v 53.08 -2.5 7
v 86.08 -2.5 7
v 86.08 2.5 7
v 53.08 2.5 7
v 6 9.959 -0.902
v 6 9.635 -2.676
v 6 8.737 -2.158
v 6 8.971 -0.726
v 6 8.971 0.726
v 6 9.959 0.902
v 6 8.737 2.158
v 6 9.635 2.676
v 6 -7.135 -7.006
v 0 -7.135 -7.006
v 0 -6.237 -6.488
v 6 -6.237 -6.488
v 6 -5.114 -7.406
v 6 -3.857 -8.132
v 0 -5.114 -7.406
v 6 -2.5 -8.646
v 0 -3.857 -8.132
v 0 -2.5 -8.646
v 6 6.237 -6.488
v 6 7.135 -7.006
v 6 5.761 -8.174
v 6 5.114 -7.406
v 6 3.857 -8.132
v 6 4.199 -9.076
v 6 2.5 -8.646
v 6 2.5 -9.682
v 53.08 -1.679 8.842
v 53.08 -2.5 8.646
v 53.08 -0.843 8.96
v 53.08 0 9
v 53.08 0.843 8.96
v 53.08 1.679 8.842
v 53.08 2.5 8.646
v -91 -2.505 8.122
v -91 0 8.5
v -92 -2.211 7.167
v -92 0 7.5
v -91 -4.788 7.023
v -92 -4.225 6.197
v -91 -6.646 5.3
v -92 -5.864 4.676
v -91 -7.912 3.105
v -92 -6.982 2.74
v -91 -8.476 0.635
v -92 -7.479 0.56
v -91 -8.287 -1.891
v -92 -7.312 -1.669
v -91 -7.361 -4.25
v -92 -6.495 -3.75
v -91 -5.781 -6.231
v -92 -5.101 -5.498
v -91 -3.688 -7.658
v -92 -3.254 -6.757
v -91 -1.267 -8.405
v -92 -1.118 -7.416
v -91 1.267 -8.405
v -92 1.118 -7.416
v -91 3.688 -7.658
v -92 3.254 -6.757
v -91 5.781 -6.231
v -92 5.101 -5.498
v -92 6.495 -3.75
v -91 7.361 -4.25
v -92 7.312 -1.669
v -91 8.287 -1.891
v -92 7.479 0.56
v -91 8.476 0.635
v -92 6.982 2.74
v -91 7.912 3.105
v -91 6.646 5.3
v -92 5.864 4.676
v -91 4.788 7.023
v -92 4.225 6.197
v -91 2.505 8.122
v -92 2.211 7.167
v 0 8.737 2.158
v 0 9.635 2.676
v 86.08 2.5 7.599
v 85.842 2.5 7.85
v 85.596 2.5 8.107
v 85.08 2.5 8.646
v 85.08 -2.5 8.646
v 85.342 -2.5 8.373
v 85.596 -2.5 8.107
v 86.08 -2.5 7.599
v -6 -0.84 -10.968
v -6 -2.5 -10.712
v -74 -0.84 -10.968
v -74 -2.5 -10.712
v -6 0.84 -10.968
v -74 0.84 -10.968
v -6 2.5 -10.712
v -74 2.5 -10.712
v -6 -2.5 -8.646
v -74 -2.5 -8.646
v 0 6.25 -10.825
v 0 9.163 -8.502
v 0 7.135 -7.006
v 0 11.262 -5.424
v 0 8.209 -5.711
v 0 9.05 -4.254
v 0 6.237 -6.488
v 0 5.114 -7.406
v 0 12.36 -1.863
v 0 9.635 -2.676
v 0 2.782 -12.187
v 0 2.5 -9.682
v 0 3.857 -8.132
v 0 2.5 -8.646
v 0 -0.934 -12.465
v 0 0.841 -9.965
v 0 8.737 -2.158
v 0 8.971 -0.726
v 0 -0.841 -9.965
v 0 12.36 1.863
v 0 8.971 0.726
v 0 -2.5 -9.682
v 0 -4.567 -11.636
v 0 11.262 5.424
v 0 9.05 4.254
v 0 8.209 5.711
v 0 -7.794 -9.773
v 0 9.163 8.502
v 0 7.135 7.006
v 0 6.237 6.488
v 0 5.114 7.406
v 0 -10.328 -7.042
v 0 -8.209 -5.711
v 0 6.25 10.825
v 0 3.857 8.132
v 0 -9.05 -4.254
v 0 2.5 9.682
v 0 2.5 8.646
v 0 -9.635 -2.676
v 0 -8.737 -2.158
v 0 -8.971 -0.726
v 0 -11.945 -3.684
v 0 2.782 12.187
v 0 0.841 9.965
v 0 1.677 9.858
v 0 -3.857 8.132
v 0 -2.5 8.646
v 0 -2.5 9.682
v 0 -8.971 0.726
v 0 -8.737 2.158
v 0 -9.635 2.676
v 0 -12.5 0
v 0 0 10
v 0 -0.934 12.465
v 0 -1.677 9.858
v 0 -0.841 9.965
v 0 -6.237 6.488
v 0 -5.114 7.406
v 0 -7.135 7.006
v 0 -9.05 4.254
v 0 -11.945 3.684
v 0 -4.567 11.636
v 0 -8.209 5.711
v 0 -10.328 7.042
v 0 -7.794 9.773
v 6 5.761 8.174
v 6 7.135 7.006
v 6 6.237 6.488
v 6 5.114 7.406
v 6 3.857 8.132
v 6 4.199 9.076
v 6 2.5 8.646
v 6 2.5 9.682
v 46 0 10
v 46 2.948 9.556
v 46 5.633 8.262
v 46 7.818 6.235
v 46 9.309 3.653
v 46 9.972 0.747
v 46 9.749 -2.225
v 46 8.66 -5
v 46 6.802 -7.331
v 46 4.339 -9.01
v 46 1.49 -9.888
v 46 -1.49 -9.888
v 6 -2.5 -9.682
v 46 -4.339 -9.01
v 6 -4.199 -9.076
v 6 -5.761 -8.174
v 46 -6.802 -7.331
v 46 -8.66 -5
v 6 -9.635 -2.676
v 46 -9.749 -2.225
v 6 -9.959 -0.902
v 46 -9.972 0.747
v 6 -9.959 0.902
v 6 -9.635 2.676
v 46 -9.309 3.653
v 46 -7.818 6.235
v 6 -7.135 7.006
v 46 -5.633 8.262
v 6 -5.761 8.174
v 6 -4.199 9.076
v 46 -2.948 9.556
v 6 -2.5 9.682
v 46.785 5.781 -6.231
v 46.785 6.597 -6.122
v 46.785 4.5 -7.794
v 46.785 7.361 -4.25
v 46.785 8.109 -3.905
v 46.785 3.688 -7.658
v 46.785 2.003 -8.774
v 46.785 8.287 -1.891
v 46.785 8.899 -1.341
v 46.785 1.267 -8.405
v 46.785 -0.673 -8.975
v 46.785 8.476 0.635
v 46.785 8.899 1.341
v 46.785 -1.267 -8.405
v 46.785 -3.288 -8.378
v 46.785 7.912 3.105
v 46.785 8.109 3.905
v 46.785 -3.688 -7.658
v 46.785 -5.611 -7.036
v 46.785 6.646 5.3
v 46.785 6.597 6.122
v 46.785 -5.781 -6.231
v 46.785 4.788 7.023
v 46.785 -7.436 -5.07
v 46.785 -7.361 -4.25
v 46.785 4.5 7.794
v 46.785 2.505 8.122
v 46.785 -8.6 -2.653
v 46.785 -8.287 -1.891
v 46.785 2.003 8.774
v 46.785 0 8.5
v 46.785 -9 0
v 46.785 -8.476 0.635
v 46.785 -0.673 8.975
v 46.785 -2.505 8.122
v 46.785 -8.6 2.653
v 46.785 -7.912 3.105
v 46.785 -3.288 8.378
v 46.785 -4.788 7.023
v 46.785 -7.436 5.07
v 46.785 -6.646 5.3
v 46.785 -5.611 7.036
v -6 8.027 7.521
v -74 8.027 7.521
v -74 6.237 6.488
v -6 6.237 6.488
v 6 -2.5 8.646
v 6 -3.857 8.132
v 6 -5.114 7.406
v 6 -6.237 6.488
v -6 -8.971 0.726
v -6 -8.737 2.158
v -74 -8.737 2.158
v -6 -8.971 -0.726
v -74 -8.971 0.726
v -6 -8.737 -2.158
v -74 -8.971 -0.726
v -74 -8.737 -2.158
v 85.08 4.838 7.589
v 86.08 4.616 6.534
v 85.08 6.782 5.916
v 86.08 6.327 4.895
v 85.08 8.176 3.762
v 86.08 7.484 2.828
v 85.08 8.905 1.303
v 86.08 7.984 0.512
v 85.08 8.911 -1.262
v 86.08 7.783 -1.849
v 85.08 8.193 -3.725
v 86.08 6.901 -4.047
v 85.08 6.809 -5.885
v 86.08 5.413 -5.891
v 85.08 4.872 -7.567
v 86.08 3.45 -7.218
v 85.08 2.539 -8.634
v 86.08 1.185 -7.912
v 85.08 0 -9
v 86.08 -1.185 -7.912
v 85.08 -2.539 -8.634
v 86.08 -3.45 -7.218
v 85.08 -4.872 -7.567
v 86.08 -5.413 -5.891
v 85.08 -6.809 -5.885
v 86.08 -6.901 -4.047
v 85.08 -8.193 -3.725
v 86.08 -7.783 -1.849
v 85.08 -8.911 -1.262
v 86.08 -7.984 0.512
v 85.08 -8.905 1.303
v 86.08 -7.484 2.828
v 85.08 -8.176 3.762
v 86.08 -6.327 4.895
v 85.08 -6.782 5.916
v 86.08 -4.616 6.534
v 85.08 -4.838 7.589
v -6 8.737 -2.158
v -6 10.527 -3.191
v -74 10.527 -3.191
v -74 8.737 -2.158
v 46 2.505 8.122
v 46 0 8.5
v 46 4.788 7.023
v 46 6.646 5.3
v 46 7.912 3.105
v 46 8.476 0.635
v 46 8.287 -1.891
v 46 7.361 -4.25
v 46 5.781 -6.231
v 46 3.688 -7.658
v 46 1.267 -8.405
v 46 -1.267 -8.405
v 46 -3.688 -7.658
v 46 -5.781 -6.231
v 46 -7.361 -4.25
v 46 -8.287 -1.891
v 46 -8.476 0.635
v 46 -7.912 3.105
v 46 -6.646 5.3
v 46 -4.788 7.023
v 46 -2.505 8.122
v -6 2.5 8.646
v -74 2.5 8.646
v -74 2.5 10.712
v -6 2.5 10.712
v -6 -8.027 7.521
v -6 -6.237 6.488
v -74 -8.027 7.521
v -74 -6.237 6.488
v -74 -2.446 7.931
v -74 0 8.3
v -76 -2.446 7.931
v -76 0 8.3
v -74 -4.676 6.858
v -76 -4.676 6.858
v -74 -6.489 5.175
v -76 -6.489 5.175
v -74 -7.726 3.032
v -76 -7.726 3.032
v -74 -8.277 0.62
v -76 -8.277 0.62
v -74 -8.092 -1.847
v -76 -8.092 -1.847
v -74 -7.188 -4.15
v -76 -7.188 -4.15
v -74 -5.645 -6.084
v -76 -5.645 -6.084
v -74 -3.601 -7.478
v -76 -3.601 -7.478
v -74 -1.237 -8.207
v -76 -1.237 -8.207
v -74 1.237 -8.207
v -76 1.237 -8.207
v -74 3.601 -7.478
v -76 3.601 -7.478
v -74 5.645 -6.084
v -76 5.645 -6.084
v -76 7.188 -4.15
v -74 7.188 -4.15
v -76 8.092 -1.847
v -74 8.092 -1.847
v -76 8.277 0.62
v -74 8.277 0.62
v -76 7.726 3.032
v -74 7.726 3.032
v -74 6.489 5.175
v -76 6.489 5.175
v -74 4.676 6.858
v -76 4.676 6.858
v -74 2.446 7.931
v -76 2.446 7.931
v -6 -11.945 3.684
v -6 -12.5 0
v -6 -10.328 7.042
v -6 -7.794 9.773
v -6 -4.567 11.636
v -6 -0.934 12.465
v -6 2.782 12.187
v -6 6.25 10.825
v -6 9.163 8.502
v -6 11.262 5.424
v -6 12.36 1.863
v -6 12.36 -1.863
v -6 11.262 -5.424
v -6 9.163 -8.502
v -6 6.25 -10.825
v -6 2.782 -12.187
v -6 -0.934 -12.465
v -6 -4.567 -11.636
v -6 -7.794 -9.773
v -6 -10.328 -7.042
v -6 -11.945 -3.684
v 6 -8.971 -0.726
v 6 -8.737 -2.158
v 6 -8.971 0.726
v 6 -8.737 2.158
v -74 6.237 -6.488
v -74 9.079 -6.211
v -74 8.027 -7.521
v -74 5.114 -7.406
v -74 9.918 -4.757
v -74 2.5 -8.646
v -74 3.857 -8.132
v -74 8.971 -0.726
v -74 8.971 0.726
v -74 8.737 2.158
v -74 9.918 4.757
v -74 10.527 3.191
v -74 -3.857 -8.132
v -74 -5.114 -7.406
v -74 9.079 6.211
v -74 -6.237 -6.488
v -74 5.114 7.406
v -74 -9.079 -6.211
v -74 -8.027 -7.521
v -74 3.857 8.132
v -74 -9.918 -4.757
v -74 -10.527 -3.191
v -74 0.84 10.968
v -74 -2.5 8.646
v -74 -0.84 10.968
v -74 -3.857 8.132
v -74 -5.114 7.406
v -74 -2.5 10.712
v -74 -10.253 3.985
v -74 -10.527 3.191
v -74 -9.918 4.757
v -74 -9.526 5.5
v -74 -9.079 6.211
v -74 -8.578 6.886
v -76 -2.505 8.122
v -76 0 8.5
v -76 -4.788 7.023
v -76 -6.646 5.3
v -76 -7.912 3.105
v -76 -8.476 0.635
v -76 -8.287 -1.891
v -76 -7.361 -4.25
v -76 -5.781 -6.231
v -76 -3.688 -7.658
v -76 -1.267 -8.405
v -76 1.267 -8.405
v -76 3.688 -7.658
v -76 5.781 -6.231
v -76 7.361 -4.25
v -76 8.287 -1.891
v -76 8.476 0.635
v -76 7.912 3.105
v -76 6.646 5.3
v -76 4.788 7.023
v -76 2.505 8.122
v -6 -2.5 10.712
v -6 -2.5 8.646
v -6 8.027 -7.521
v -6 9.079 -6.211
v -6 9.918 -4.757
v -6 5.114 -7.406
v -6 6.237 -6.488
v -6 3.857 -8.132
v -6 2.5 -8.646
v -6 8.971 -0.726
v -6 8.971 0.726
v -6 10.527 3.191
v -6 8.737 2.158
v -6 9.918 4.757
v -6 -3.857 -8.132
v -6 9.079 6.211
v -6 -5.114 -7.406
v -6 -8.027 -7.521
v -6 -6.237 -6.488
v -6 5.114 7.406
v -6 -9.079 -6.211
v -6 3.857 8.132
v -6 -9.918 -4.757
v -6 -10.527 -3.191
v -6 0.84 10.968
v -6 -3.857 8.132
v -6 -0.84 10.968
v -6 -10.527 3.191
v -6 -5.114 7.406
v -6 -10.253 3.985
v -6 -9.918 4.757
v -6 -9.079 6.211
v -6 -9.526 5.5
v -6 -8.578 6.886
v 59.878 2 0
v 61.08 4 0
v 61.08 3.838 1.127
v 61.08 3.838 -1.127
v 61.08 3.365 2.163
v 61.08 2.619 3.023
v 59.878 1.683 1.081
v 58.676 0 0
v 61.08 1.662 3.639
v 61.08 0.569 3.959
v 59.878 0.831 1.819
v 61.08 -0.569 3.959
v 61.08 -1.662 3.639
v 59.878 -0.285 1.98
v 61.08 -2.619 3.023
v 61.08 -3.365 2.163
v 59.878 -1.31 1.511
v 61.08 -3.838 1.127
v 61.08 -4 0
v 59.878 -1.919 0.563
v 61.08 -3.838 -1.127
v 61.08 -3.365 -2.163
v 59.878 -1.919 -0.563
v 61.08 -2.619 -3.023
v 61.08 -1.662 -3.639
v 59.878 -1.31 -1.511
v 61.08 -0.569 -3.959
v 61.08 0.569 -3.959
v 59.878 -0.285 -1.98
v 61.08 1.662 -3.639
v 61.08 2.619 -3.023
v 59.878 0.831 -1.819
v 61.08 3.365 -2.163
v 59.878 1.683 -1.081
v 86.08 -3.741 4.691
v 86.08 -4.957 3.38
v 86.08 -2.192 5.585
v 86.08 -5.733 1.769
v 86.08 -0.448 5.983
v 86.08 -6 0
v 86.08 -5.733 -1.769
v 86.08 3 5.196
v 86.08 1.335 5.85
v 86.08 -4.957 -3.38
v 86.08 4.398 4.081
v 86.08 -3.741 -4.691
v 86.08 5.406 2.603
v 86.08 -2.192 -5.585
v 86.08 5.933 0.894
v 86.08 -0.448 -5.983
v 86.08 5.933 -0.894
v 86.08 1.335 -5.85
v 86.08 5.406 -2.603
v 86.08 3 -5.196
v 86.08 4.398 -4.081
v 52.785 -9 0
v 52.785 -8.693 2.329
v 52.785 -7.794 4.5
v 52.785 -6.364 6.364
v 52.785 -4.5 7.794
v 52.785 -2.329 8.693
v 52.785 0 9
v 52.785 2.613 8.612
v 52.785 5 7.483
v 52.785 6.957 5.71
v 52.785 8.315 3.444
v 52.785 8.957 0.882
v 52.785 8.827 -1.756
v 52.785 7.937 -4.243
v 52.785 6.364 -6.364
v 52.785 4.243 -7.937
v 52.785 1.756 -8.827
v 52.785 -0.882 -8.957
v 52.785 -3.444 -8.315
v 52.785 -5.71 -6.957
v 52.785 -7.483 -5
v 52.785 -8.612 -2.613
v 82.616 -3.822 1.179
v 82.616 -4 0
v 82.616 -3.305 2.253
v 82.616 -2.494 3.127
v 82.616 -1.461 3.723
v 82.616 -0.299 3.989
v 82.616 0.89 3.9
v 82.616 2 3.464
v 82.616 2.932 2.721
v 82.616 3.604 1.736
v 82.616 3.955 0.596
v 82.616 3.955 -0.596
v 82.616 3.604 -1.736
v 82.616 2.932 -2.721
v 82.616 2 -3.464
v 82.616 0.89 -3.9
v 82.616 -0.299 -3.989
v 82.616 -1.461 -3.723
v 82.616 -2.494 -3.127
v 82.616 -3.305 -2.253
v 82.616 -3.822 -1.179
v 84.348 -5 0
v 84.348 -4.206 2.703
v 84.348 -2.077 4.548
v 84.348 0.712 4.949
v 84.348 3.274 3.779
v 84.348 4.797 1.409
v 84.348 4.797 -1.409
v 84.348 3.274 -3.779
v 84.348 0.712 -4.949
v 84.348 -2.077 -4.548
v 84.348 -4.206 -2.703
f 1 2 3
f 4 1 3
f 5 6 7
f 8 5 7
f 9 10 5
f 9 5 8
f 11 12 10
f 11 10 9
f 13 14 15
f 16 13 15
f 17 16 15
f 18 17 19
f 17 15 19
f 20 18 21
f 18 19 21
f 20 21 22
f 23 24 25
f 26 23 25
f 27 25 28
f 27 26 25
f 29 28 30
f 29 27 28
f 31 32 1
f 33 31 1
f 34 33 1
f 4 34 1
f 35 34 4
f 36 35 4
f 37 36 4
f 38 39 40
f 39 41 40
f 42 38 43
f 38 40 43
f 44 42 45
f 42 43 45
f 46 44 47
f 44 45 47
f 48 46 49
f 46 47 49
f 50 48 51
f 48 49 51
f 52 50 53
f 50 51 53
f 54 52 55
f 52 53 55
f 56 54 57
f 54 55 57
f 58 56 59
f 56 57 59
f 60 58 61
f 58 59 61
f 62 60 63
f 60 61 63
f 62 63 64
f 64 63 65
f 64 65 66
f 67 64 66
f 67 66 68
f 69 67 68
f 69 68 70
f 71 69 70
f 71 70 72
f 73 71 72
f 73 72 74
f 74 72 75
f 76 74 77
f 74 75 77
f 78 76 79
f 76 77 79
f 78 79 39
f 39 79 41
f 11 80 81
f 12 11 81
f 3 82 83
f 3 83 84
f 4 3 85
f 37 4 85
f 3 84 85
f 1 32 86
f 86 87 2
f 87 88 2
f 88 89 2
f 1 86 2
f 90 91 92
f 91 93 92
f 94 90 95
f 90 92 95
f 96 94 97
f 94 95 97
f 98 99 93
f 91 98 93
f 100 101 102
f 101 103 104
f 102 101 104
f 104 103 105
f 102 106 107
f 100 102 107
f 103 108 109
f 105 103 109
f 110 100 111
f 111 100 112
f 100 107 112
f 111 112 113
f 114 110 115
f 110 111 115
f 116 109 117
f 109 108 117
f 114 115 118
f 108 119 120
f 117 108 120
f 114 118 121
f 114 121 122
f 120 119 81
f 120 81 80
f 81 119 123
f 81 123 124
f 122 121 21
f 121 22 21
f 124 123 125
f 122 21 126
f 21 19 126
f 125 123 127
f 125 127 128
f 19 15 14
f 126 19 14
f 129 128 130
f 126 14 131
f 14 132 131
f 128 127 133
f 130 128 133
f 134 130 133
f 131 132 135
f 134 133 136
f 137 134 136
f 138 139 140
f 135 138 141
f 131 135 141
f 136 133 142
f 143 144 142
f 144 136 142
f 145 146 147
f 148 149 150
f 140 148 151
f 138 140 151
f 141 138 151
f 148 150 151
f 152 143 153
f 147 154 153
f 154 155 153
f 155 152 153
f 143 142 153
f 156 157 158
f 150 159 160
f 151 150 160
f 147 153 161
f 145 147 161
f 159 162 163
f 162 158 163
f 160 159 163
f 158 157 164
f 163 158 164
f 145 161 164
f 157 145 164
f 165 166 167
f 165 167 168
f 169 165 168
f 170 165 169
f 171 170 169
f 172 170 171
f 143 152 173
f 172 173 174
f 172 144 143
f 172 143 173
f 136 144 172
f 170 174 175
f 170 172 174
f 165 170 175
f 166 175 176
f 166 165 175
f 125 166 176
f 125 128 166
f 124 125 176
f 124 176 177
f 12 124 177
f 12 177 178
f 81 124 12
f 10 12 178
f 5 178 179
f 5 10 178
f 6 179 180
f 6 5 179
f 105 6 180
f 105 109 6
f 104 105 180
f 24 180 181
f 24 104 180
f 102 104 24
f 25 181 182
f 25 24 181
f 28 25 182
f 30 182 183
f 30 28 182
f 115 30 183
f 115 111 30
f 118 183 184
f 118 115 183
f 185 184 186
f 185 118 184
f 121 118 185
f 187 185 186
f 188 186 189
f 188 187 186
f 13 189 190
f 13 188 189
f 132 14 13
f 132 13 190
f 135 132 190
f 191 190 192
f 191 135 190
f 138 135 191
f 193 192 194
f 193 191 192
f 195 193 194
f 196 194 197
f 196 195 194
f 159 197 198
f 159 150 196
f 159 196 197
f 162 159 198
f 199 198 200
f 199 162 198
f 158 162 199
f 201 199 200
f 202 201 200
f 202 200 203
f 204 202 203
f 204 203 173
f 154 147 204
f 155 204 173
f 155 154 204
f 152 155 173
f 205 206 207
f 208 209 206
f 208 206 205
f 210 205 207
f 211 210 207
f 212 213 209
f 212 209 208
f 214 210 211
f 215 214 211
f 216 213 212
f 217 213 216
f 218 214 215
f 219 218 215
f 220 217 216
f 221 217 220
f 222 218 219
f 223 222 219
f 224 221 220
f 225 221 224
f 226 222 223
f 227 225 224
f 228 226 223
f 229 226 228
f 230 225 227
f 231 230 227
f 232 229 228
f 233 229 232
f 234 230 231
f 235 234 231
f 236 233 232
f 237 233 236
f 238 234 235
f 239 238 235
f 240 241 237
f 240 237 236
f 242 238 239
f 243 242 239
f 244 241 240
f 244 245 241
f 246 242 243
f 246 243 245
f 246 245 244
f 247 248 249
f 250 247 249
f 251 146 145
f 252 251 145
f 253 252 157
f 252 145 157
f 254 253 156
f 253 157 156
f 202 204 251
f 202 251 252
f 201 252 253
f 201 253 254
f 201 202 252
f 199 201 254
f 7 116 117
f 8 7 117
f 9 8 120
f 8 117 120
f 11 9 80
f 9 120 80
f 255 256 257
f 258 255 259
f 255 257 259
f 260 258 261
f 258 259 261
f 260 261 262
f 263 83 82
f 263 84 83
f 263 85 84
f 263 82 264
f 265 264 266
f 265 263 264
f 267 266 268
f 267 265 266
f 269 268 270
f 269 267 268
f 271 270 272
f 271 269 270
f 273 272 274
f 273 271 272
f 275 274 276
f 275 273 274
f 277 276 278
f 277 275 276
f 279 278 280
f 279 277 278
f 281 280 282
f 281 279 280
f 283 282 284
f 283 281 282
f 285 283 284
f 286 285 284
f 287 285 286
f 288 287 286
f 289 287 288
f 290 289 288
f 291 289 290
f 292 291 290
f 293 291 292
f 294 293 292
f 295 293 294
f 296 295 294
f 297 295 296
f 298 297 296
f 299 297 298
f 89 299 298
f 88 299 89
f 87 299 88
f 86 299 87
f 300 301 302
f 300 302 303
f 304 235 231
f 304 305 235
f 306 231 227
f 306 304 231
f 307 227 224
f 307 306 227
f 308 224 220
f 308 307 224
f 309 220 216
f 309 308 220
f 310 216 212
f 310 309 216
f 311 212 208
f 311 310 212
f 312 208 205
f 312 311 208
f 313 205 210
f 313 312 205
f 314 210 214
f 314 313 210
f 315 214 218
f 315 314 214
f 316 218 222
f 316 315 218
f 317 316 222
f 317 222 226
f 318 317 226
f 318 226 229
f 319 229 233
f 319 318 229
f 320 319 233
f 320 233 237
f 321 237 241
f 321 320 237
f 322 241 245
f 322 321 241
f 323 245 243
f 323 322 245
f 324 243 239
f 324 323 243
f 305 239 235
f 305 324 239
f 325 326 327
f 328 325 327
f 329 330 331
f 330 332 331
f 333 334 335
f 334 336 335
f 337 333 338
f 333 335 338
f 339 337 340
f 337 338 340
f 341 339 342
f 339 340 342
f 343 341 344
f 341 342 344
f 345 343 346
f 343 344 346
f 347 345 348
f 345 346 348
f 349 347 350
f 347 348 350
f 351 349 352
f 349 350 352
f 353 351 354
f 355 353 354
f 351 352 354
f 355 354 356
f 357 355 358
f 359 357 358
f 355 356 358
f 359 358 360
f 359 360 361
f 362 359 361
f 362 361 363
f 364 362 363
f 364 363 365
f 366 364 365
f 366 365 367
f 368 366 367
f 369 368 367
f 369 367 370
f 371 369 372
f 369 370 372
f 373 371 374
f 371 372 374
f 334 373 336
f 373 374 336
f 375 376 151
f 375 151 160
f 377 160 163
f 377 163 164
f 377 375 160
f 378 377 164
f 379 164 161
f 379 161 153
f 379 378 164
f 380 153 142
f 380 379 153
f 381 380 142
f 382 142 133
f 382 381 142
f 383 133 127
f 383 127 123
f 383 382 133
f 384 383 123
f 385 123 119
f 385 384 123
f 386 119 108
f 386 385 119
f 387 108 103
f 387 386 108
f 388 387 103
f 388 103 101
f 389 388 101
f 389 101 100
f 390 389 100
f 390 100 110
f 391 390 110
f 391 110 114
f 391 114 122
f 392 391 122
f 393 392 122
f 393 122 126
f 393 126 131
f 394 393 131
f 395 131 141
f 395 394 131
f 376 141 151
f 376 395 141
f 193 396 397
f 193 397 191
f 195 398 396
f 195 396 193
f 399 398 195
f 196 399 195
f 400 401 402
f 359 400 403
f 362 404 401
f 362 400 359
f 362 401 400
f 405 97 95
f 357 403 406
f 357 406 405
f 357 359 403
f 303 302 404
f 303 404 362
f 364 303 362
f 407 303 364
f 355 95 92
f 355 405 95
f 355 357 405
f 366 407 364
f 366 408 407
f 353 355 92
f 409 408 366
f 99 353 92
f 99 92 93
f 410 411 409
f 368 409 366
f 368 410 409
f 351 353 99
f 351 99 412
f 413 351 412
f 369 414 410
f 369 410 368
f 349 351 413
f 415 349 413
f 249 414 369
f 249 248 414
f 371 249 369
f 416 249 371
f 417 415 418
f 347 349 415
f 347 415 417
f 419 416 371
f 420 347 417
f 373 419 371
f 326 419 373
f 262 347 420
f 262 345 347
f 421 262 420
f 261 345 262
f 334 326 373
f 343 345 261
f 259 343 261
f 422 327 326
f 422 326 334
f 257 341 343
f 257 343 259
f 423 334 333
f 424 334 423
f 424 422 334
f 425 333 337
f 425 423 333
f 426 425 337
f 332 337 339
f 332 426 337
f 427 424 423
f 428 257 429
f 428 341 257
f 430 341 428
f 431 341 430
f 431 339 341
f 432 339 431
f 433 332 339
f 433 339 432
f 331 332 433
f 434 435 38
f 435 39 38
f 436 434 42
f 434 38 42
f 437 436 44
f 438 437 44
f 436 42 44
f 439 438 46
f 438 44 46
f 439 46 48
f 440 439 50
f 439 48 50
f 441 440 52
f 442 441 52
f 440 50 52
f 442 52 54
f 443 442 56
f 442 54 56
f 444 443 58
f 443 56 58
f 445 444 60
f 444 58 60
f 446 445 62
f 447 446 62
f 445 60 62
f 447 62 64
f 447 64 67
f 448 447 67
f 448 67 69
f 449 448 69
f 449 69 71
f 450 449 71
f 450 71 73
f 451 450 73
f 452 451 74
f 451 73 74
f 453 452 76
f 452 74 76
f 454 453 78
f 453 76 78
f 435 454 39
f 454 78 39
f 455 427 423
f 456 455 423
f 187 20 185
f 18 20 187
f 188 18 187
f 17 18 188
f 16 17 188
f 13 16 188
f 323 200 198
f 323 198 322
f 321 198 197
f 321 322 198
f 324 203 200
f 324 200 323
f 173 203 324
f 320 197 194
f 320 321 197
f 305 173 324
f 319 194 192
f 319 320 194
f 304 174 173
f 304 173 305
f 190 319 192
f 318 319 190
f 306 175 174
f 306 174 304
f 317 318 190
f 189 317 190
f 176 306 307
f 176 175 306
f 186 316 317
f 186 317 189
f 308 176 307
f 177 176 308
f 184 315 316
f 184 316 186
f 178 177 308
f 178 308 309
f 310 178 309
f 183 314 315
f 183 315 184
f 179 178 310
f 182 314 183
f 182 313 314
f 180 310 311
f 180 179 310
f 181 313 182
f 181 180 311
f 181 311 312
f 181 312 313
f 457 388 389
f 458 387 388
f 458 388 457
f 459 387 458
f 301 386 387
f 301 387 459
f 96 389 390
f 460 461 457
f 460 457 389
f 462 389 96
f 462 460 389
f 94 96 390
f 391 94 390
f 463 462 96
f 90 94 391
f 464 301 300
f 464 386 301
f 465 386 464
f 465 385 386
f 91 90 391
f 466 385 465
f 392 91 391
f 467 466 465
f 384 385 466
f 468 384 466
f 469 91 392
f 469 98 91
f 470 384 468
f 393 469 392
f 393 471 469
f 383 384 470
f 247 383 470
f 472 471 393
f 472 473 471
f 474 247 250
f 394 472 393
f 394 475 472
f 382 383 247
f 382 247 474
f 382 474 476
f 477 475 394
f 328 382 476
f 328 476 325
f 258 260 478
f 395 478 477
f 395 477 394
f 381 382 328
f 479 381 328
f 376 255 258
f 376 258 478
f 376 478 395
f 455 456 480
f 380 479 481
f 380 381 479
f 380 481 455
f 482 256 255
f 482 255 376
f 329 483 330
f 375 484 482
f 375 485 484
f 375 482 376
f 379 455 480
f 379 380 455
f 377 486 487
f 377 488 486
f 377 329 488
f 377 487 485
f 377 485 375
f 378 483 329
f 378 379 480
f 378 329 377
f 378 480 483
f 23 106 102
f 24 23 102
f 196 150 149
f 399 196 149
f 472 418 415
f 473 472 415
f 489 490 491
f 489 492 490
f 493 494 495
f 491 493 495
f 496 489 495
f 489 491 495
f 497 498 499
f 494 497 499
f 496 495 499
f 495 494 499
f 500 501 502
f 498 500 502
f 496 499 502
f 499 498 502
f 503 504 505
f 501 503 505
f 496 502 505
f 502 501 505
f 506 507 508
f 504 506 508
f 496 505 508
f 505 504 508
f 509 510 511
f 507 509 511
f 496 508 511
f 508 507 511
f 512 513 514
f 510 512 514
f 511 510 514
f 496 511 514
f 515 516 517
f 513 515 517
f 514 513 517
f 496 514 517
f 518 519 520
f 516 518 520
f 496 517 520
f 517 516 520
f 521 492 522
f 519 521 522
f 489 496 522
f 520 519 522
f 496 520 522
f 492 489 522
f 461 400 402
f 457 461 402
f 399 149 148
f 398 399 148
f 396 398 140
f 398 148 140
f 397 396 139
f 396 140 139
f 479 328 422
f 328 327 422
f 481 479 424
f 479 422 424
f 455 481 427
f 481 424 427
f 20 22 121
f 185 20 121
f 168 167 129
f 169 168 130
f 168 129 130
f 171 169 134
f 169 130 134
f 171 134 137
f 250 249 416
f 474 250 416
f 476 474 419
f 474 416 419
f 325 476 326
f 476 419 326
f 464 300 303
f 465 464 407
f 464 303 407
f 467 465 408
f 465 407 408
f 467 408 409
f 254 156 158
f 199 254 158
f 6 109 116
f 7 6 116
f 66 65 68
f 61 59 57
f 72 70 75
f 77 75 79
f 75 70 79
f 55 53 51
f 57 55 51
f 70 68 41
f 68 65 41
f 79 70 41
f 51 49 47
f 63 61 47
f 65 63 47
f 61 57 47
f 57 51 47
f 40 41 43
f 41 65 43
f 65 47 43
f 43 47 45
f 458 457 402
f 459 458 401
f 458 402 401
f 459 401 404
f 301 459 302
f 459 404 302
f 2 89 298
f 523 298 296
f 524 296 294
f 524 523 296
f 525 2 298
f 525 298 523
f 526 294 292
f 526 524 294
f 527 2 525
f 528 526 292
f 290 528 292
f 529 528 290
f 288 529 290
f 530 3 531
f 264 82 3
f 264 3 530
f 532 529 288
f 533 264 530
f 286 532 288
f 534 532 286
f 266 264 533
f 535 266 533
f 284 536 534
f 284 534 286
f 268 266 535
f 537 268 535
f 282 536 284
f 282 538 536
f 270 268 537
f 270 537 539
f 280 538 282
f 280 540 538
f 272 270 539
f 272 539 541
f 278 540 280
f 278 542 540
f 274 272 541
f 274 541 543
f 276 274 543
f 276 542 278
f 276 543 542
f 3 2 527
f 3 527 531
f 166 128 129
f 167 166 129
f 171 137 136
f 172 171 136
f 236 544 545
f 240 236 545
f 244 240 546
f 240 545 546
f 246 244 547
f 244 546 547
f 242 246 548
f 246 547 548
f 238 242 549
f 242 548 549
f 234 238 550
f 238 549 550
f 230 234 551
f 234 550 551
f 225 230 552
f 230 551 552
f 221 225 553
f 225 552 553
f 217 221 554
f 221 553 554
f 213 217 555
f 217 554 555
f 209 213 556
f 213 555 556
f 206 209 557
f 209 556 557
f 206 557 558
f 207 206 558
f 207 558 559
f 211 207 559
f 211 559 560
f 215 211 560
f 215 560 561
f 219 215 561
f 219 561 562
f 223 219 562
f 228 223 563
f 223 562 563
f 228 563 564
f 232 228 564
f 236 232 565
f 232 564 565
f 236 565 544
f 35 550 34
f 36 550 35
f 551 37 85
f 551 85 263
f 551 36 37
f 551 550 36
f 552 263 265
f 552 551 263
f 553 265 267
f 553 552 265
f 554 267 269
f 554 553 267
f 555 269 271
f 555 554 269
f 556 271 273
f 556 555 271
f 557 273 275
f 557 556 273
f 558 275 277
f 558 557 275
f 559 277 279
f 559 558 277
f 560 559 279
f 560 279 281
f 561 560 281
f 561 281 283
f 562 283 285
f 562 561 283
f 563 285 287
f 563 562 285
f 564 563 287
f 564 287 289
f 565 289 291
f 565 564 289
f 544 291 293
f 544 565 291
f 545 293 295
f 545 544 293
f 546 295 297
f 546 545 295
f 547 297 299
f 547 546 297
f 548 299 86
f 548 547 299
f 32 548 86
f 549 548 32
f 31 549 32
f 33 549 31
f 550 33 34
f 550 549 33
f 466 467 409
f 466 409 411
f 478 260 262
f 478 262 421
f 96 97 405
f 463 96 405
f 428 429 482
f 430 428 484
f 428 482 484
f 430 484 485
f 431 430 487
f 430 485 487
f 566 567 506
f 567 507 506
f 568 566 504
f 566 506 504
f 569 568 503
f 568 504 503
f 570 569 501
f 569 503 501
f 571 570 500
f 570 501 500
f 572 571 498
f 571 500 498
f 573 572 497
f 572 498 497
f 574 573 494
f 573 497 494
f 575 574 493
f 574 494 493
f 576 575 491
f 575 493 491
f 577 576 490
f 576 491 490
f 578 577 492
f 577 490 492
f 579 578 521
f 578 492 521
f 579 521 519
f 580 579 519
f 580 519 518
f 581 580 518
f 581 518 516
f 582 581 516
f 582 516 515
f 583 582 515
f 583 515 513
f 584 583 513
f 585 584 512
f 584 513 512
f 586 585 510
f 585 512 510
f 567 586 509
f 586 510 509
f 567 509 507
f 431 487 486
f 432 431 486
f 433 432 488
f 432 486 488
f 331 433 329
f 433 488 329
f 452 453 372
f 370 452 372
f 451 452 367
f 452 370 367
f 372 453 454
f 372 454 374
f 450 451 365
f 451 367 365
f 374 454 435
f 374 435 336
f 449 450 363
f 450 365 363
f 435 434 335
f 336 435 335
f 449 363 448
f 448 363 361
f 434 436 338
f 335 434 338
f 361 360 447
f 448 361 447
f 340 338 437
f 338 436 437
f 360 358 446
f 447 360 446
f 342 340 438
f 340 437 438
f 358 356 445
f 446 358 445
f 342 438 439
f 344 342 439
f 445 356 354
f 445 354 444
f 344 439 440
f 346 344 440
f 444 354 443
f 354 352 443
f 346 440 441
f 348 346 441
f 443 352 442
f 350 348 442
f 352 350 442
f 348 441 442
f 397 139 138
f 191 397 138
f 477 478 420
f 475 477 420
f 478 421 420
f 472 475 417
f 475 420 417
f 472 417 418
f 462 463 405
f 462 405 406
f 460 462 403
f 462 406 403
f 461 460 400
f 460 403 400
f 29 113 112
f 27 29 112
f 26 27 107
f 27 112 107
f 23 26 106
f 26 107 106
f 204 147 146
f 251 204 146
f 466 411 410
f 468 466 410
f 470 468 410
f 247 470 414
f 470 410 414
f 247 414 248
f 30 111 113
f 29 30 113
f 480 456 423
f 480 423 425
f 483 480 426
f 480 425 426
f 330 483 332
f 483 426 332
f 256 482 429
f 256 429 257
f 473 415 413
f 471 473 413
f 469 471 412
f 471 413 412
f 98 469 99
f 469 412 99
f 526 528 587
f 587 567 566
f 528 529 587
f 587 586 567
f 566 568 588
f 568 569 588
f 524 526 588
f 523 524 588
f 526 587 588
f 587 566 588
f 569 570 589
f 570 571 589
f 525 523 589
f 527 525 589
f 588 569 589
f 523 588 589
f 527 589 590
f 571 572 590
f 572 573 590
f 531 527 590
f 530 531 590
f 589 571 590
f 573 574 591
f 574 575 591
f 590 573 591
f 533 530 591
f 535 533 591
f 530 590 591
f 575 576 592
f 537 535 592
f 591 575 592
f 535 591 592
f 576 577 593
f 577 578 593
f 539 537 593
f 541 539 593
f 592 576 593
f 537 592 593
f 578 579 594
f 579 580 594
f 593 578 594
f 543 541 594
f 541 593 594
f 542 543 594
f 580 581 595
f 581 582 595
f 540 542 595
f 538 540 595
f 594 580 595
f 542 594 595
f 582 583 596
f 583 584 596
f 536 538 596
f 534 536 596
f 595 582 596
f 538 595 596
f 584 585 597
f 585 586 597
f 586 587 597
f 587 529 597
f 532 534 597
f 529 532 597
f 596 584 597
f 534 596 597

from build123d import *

# Parameters (mm, degrees)
F2_R            = 12.5
F3_DEPTH        = 6
F5_DEPTH        = 68
F6_R            = 12.5
F7_DEPTH        = 12
F8_DEPTH        = 6
F12_D           = 8
F12_DEPTH       = 25
F12_CSINK_D     = 12
F12_CSINK_ANGLE = 60
F12_TIP         = 2.4034424761
F14_DEPTH       = 33
F15_R           = 9
F15_R_2         = 8.5
F16_DEPTH       = 6


with BuildPart() as f1:
    # F0 (on Front) → F1 (revolve)
    with BuildSketch(Plane.XZ):
        Polygon((0, 10), (0, 0), (86.0796358759, 0), (86.0796358759, 8), (85.0796358759, 9), (52.7846625228, 9), (52.7846625228, 8.5), (46, 8.5), (46, 10), align=None)
    revolve(axis=Axis((43.0398179379, 0, 0), (-1, 0, 0)))

    # F2 (on face) → F3 (join)
    with BuildSketch(Plane(origin=(0, 0, 0), x_dir=(0, -1, 0), z_dir=(-1, 0, 0))):
        Circle(F2_R)
    extrude(amount=F3_DEPTH)

    # F4 (on face) → F5 (join)
    with BuildSketch(Plane(origin=(-6, 0, 0), x_dir=(0, -1, 0), z_dir=(-1, 0, 0))):
        with BuildLine():
            Line((8.0269876576, 7.5211348309), (6.2374895659, 6.4879676259))
            ThreePointArc((6.2374895659, 6.4879676259), (4.5, 7.7942286341), (2.5, 8.6458082329))
            Line((2.5, 8.6458082329), (2.5, 10.7121426428))
            ThreePointArc((2.5, 10.7121426428), (0, 11), (-2.5, 10.7121426428))
            Line((-2.5, 10.7121426428), (-2.5, 8.6458082329))
            ThreePointArc((-2.5, 8.6458082329), (-4.5, 7.7942286341), (-6.2374895659, 6.4879676259))
            Line((-6.2374895659, 6.4879676259), (-8.0269876576, 7.5211348309))
            ThreePointArc((-8.0269876576, 7.5211348309), (-9.5262794416, 5.5), (-10.5269876576, 3.1910078119))
            Line((-10.5269876576, 3.1910078119), (-8.7374895659, 2.157840607))
            ThreePointArc((-8.7374895659, 2.157840607), (-9, 0), (-8.7374895659, -2.157840607))
            Line((-8.7374895659, -2.157840607), (-10.5269876576, -3.1910078119))
            ThreePointArc((-10.5269876576, -3.1910078119), (-9.5262794416, -5.5), (-8.0269876576, -7.5211348309))
            Line((-8.0269876576, -7.5211348309), (-6.2374895659, -6.4879676259))
            ThreePointArc((-6.2374895659, -6.4879676259), (-4.5, -7.7942286341), (-2.5, -8.6458082329))
            Line((-2.5, -8.6458082329), (-2.5, -10.7121426428))
            ThreePointArc((-2.5, -10.7121426428), (0, -11), (2.5, -10.7121426428))
            Line((2.5, -10.7121426428), (2.5, -8.6458082329))
            ThreePointArc((2.5, -8.6458082329), (4.5, -7.7942286341), (6.2374895659, -6.4879676259))
            Line((6.2374895659, -6.4879676259), (8.0269876576, -7.5211348309))
            ThreePointArc((8.0269876576, -7.5211348309), (9.5262794416, -5.5), (10.5269876576, -3.1910078119))
            Line((10.5269876576, -3.1910078119), (8.7374895659, -2.157840607))
            ThreePointArc((8.7374895659, -2.157840607), (9, 0), (8.7374895659, 2.157840607))
            Line((8.7374895659, 2.157840607), (10.5269876576, 3.1910078119))
            ThreePointArc((10.5269876576, 3.1910078119), (10.0928807369, 4.3742151788), (9.5262794416, 5.5))
            ThreePointArc((9.5262794416, 5.5), (8.8346218349, 6.5535835262), (8.0269876576, 7.5211348309))
        make_face()
    extrude(amount=F5_DEPTH)

    # F6 (on face) → F7 (cut)
    with BuildSketch(Plane(origin=(-6, 0, 0), x_dir=(0, -1, 0), z_dir=(-1, 0, 0))):
        Circle(F6_R)
        with BuildLine():
            ThreePointArc((2.5, 8.6458082329), (4.5, 7.7942286341), (6.2374895659, 6.4879676259))
            Line((6.2374895659, 6.4879676259), (8.0269876576, 7.5211348309))
            ThreePointArc((8.0269876576, 7.5211348309), (9.5262794416, 5.5), (10.5269876576, 3.1910078119))
            Line((10.5269876576, 3.1910078119), (8.7374895659, 2.157840607))
            ThreePointArc((8.7374895659, 2.157840607), (9, 0), (8.7374895659, -2.157840607))
            Line((8.7374895659, -2.157840607), (10.5269876576, -3.1910078119))
            ThreePointArc((10.5269876576, -3.1910078119), (9.5262794416, -5.5), (8.0269876576, -7.5211348309))
            Line((8.0269876576, -7.5211348309), (6.2374895659, -6.4879676259))
            ThreePointArc((6.2374895659, -6.4879676259), (4.5, -7.7942286341), (2.5, -8.6458082329))
            Line((2.5, -8.6458082329), (2.5, -10.7121426428))
            ThreePointArc((2.5, -10.7121426428), (0, -11), (-2.5, -10.7121426428))
            Line((-2.5, -10.7121426428), (-2.5, -8.6458082329))
            ThreePointArc((-2.5, -8.6458082329), (-4.5, -7.7942286341), (-6.2374895659, -6.4879676259))
            Line((-6.2374895659, -6.4879676259), (-8.0269876576, -7.5211348309))
            ThreePointArc((-8.0269876576, -7.5211348309), (-9.5262794416, -5.5), (-10.5269876576, -3.1910078119))
            Line((-10.5269876576, -3.1910078119), (-8.7374895659, -2.157840607))
            ThreePointArc((-8.7374895659, -2.157840607), (-9, 0), (-8.7374895659, 2.157840607))
            Line((-8.7374895659, 2.157840607), (-10.5269876576, 3.1910078119))
            ThreePointArc((-10.5269876576, 3.1910078119), (-9.5262794416, 5.5), (-8.0269876576, 7.5211348309))
            Line((-8.0269876576, 7.5211348309), (-6.2374895659, 6.4879676259))
            ThreePointArc((-6.2374895659, 6.4879676259), (-4.5, 7.7942286341), (-2.5, 8.6458082329))
            Line((-2.5, 8.6458082329), (-2.5, 10.7121426428))
            ThreePointArc((-2.5, 10.7121426428), (0, 11), (2.5, 10.7121426428))
            Line((2.5, 10.7121426428), (2.5, 8.6458082329))
        make_face(mode=Mode.SUBTRACT)
    extrude(amount=-F7_DEPTH, mode=Mode.SUBTRACT)

    # F6 (on face) → F8 (join)
    with BuildSketch(Plane(origin=(-6, 0, 0), x_dir=(0, -1, 0), z_dir=(-1, 0, 0))):
        Circle(F6_R)
        with BuildLine():
            ThreePointArc((2.5, 8.6458082329), (4.5, 7.7942286341), (6.2374895659, 6.4879676259))
            Line((6.2374895659, 6.4879676259), (8.0269876576, 7.5211348309))
            ThreePointArc((8.0269876576, 7.5211348309), (9.5262794416, 5.5), (10.5269876576, 3.1910078119))
            Line((10.5269876576, 3.1910078119), (8.7374895659, 2.157840607))
            ThreePointArc((8.7374895659, 2.157840607), (9, 0), (8.7374895659, -2.157840607))
            Line((8.7374895659, -2.157840607), (10.5269876576, -3.1910078119))
            ThreePointArc((10.5269876576, -3.1910078119), (9.5262794416, -5.5), (8.0269876576, -7.5211348309))
            Line((8.0269876576, -7.5211348309), (6.2374895659, -6.4879676259))
            ThreePointArc((6.2374895659, -6.4879676259), (4.5, -7.7942286341), (2.5, -8.6458082329))
            Line((2.5, -8.6458082329), (2.5, -10.7121426428))
            ThreePointArc((2.5, -10.7121426428), (0, -11), (-2.5, -10.7121426428))
            Line((-2.5, -10.7121426428), (-2.5, -8.6458082329))
            ThreePointArc((-2.5, -8.6458082329), (-4.5, -7.7942286341), (-6.2374895659, -6.4879676259))
            Line((-6.2374895659, -6.4879676259), (-8.0269876576, -7.5211348309))
            ThreePointArc((-8.0269876576, -7.5211348309), (-9.5262794416, -5.5), (-10.5269876576, -3.1910078119))
            Line((-10.5269876576, -3.1910078119), (-8.7374895659, -2.157840607))
            ThreePointArc((-8.7374895659, -2.157840607), (-9, 0), (-8.7374895659, 2.157840607))
            Line((-8.7374895659, 2.157840607), (-10.5269876576, 3.1910078119))
            ThreePointArc((-10.5269876576, 3.1910078119), (-9.5262794416, 5.5), (-8.0269876576, 7.5211348309))
            Line((-8.0269876576, 7.5211348309), (-6.2374895659, 6.4879676259))
            ThreePointArc((-6.2374895659, 6.4879676259), (-4.5, 7.7942286341), (-2.5, 8.6458082329))
            Line((-2.5, 8.6458082329), (-2.5, 10.7121426428))
            ThreePointArc((-2.5, 10.7121426428), (0, 11), (2.5, 10.7121426428))
            Line((2.5, 10.7121426428), (2.5, 8.6458082329))
        make_face(mode=Mode.SUBTRACT)
    extrude(amount=-F8_DEPTH)

    # F9 (on Front) → F10 (revolve)
    with BuildSketch(Plane.XZ):
        Polygon((-92, 0), (-74, 0), (-74, 2.157840607), (-74, 3.1910078119), (-74, 7.5211348309), (-74, 8.3), (-76, 8.3), (-76, 8.5), (-91, 8.5), (-92, 7.5), align=None)
    revolve(axis=Axis((-83, 0, 0), (1, 0, 0)))

    # F12
    with Locations(Plane.YZ.offset(86.0796358759)):
        with Locations((0, 0)):
            CounterSinkHole(F12_D / 2, F12_CSINK_D / 2, depth=F12_DEPTH, counter_sink_angle=F12_CSINK_ANGLE)
            with Locations((0, 0, -(F12_DEPTH + F12_TIP / 2))):  # 118° drill point
                Cone(0, F12_D / 2, F12_TIP, mode=Mode.SUBTRACT)

    # F13 (on face) → F14 (cut)
    with BuildSketch(Plane.YZ.offset(86.0796358759)):
        with BuildLine():
            Line((-2.5, 7), (0, 7))
            Line((0, 7), (2.5, 7))
            Line((2.5, 7), (2.5, 8.6458082329))
            ThreePointArc((2.5, 8.6458082329), (0, 9), (-2.5, 8.6458082329))
            Line((-2.5, 8.6458082329), (-2.5, 7))
        make_face()
    extrude(amount=-F14_DEPTH, mode=Mode.SUBTRACT)

    # F15 (on face) → F16 (join)
    with BuildSketch(Plane(origin=(52.7846625228, 0, 0), x_dir=(0, -1, 0), z_dir=(-1, 0, 0))):
        Circle(F15_R)
        Circle(F15_R_2, mode=Mode.SUBTRACT)
    extrude(amount=F16_DEPTH)


solid = f1.part
